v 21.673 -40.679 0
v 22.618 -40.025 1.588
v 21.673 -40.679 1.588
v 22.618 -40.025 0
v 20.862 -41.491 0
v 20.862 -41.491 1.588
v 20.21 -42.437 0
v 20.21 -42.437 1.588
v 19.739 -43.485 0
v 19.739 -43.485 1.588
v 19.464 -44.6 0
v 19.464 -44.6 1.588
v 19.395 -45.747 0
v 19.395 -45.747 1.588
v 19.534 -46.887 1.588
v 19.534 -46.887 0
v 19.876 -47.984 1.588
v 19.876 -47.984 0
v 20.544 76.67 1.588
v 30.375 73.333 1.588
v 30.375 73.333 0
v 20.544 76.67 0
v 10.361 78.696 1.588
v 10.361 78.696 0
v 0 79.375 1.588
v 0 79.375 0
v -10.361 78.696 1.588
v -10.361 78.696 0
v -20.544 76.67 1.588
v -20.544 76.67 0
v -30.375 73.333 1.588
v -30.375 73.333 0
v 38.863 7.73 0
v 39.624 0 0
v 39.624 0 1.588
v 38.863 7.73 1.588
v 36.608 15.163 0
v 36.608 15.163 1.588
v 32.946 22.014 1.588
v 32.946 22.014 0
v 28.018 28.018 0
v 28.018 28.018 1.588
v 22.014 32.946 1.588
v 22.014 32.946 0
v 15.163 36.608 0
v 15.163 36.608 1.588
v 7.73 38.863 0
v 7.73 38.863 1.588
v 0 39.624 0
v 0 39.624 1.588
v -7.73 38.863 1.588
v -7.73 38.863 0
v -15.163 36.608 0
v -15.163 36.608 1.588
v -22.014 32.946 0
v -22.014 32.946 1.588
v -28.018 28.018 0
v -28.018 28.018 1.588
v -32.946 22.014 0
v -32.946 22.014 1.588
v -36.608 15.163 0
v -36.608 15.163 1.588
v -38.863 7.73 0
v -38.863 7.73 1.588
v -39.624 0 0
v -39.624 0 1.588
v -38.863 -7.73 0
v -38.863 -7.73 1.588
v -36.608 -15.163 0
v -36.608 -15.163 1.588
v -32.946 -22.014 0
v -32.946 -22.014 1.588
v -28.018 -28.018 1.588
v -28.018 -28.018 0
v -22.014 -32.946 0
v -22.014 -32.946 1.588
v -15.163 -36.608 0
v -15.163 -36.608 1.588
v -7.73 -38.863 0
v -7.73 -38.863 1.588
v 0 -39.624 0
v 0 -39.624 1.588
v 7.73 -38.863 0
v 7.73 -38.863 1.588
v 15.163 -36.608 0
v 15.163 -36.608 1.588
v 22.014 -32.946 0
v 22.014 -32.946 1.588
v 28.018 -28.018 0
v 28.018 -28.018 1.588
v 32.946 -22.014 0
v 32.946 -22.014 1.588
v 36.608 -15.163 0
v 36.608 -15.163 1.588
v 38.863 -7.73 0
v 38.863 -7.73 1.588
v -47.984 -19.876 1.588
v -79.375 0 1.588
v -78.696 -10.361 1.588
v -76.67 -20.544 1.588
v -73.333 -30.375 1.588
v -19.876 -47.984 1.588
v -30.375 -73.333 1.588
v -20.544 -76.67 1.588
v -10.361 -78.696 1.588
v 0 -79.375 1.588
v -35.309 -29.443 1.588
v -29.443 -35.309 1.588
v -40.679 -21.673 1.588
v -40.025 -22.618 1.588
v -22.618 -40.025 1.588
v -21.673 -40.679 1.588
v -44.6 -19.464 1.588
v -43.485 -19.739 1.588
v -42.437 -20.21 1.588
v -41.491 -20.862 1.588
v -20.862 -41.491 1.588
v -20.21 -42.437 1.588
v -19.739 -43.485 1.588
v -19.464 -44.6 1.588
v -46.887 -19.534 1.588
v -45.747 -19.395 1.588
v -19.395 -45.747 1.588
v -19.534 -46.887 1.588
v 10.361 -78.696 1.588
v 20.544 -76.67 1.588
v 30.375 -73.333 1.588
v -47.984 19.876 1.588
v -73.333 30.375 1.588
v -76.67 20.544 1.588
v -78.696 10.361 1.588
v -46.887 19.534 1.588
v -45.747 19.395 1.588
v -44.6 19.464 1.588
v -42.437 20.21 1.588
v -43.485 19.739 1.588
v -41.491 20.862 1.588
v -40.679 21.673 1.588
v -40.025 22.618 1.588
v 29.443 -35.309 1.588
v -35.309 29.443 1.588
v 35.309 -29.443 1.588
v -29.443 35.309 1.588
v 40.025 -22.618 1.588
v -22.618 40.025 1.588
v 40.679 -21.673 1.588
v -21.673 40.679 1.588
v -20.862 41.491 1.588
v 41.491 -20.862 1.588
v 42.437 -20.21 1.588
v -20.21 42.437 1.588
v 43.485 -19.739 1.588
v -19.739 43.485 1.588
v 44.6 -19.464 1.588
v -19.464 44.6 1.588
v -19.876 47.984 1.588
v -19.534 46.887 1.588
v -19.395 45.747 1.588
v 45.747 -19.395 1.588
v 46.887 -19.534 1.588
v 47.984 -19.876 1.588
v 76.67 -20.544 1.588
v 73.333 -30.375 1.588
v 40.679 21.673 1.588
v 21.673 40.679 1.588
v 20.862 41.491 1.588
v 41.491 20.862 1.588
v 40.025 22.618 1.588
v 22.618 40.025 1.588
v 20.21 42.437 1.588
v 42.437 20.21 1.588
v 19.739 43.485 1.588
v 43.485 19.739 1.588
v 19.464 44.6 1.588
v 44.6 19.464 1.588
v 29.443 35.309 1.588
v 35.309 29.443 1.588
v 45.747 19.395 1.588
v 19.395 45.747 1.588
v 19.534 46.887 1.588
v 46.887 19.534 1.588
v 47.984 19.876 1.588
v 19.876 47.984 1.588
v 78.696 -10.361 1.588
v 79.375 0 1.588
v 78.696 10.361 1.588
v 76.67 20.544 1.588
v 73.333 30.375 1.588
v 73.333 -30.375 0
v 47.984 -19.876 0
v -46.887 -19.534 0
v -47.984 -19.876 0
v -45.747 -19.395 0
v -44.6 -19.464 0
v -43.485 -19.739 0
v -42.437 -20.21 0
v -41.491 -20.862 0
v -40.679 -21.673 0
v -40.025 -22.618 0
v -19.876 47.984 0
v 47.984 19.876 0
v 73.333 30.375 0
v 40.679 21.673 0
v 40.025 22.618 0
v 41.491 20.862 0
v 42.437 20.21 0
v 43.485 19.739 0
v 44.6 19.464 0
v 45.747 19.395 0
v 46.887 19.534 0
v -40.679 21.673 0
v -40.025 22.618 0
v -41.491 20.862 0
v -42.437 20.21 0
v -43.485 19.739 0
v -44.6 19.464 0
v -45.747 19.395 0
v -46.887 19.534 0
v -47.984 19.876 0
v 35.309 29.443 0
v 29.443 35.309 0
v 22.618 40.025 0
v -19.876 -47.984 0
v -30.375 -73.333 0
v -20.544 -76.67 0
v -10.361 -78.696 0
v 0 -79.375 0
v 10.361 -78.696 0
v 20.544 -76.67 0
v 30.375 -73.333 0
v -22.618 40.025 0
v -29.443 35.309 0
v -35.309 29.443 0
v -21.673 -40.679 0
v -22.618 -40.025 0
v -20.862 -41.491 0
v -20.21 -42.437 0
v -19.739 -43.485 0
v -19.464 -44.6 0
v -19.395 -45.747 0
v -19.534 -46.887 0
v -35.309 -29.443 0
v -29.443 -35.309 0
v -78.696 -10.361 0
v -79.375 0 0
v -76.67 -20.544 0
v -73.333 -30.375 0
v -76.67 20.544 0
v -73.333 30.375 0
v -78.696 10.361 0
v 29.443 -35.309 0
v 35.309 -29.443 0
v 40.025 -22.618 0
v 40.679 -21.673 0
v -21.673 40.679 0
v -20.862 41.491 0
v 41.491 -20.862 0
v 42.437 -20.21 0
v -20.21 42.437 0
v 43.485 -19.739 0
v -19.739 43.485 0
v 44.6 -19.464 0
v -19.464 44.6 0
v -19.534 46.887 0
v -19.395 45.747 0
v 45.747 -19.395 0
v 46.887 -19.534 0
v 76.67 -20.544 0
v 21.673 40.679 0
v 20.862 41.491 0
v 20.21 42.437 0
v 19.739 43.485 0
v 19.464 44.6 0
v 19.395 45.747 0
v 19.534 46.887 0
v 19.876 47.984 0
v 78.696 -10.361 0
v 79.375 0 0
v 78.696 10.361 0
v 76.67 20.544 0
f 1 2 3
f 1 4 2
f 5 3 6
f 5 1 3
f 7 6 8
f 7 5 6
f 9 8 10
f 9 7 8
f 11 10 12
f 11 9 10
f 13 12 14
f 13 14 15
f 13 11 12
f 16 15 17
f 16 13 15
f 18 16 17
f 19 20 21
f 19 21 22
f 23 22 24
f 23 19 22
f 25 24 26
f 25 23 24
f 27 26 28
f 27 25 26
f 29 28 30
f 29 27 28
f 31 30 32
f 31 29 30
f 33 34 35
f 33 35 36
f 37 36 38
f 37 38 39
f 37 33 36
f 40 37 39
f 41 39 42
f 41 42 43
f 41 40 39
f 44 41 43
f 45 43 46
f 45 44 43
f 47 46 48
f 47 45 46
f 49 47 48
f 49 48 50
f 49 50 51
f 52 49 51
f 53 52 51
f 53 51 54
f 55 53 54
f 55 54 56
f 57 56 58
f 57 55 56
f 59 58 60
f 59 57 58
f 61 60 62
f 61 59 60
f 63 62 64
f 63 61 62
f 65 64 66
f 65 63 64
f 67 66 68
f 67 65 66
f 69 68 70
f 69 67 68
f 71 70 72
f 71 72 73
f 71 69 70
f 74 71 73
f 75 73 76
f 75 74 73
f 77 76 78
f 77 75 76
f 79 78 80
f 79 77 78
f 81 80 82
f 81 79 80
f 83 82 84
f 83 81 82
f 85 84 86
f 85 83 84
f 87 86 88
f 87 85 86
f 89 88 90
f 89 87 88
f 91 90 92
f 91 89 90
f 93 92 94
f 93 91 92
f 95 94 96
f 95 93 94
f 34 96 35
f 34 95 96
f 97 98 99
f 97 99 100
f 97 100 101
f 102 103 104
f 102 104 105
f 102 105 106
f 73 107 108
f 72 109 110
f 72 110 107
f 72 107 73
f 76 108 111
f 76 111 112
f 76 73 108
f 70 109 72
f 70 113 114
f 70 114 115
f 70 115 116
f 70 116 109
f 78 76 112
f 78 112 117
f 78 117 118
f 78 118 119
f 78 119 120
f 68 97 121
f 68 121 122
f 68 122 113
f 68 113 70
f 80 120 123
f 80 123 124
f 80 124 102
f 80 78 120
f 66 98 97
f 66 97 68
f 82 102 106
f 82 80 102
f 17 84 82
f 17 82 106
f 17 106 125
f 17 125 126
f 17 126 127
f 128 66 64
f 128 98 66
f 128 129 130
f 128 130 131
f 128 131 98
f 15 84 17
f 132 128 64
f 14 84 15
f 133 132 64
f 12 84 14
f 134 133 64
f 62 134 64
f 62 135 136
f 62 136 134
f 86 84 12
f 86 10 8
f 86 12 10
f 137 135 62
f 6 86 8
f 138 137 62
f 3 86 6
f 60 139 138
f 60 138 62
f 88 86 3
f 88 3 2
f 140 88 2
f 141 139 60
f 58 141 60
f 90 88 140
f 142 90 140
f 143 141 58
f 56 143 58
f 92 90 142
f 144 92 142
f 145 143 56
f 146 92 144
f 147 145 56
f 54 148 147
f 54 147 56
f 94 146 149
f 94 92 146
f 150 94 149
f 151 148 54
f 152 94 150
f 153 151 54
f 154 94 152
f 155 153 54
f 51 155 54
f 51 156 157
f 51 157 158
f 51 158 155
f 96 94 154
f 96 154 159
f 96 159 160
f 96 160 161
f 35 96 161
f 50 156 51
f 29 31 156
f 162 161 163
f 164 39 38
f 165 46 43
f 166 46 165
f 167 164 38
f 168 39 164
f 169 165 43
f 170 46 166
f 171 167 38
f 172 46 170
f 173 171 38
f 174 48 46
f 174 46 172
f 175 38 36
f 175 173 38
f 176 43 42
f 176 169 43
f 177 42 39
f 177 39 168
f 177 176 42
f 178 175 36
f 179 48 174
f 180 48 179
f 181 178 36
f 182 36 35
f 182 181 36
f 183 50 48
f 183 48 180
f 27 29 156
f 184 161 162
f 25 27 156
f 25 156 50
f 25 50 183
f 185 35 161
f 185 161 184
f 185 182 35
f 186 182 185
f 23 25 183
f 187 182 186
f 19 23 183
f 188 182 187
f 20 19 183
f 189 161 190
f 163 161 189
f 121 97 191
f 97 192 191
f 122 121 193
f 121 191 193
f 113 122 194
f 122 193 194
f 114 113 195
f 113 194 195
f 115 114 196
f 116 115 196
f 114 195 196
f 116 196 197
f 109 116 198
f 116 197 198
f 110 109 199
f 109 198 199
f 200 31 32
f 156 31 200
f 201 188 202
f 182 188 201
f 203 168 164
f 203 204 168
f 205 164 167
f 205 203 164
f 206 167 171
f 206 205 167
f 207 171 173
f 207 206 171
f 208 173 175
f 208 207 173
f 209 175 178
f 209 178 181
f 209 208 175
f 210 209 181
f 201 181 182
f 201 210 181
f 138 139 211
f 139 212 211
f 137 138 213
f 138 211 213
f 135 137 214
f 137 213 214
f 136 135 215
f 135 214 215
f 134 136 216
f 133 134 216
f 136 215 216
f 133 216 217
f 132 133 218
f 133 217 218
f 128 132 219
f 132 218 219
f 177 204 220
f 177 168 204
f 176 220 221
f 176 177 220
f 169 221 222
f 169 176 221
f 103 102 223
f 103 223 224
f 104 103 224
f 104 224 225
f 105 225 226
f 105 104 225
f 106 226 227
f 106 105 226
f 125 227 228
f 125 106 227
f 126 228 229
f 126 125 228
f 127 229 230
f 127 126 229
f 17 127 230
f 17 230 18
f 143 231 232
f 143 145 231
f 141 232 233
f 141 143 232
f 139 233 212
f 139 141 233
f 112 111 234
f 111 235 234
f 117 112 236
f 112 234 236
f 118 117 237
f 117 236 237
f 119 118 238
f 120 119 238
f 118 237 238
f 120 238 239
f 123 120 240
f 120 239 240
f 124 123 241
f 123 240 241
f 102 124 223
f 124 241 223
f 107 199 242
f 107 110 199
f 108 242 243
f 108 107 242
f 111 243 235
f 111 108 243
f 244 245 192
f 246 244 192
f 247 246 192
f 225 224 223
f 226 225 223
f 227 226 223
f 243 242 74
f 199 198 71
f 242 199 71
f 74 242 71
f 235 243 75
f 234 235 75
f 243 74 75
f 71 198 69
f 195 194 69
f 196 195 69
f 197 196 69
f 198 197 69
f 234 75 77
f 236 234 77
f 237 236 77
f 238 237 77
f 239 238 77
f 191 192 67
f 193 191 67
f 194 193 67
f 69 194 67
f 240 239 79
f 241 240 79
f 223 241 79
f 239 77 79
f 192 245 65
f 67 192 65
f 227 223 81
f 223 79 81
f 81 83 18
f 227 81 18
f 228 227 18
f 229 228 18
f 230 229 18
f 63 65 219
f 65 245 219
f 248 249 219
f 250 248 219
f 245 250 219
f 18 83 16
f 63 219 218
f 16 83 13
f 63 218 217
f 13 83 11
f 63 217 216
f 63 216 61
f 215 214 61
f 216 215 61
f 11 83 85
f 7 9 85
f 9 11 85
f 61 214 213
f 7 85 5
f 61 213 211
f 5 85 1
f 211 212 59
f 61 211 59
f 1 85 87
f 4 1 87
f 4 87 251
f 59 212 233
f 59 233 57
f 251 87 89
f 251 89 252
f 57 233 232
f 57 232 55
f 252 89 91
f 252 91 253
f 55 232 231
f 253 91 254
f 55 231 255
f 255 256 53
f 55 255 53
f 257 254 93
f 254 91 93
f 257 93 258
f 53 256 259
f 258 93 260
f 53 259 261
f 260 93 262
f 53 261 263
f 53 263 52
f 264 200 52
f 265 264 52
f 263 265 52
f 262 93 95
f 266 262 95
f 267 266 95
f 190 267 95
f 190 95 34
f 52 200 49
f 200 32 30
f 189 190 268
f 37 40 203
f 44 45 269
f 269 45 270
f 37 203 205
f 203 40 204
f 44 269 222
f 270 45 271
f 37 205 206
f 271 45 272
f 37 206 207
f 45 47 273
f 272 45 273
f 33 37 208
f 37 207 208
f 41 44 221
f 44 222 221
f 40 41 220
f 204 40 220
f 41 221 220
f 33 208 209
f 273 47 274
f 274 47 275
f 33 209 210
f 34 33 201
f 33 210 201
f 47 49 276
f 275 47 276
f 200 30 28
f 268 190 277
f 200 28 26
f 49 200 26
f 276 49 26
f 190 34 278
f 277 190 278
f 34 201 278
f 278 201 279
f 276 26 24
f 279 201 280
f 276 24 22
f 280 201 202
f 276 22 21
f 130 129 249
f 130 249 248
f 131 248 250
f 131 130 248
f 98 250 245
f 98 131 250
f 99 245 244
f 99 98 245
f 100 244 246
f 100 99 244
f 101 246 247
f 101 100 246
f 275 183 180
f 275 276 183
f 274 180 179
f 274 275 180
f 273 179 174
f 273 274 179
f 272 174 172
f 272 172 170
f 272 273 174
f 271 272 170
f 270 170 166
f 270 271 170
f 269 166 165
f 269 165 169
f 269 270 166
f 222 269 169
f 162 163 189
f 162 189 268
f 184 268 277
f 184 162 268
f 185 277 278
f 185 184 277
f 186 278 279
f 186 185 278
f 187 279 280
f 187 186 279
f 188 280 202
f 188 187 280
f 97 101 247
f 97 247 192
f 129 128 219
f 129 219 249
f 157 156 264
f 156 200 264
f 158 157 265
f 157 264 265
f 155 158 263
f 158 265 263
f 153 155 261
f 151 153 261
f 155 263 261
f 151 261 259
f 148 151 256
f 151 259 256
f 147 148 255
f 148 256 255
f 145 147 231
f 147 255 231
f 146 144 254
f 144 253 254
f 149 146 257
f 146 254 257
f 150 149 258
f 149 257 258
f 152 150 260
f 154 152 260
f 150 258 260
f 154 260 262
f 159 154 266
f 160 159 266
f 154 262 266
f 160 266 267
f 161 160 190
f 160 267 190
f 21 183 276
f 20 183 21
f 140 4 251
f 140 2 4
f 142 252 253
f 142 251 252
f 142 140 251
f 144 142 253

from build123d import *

# Parameters (mm, degrees)
SKETCH1_R                = 79.375
SKETCH1_R_2              = 39.624
BOSS_EXTRUDE1_DEPTH      = 1.5875
SKETCH2_R                = 79.375
SKETCH2_R_2              = 45.974
CUT_EXTRUDE1_DEPTH       = 2.5875
BOSS_EXTRUDE2_DEPTH      = 1.5875
FILLET1_R                = 6.35
CIRPATTERN1_COUNT        = 4
FILLET1_OF_CIRPATTERN1_R = 6.35


with BuildPart() as part:
    # Sketch1 → Boss-Extrude1 (new body)
    with BuildSketch(Plane.XY):
        Circle(SKETCH1_R)
        Circle(SKETCH1_R_2, mode=Mode.SUBTRACT)
    extrude(amount=BOSS_EXTRUDE1_DEPTH)

    # Sketch2 → Cut-Extrude1 (cut, through all)
    with BuildSketch(Plane.XY.offset(1.5875)):
        Circle(SKETCH2_R)
        Circle(SKETCH2_R_2, mode=Mode.SUBTRACT)
    extrude(amount=-CUT_EXTRUDE1_DEPTH, mode=Mode.SUBTRACT)

    # Sketch3 → Boss-Extrude2 (add)
    with BuildSketch(Plane.XY.offset(1.5875)):
        with BuildLine():
            ThreePointArc((30.375497444, 73.332937893), (0, 79.375), (-30.375497444, 73.332937893))
            Line((-30.375497444, 73.332937893), (-17.59348812, 42.474437628))
            ThreePointArc((-17.59348812, 42.474437628), (0, 45.974), (17.59348812, 42.474437628))
            Line((17.59348812, 42.474437628), (30.375497444, 73.332937893))
        make_face()
    boss_extrude2 = extrude(amount=-BOSS_EXTRUDE2_DEPTH)

    # Fillet1
    fillet1_edges = [part.edges().sort_by_distance(p)[0] for p in [
        (17.59348812, 42.474437628, 0.79375),
        (-17.59348812, 42.474437628, 0.79375),
    ]]
    fillet(fillet1_edges, radius=FILLET1_R)

    # CirPattern1: Boss-Extrude2 ×4 about axis
    cirpattern1_axis = Axis((0, 0, 0), (0, 0, 1))
    for i in range(1, CIRPATTERN1_COUNT):
        add(boss_extrude2.rotate(cirpattern1_axis, i * 360 / CIRPATTERN1_COUNT))

    # Fillet1 of CirPattern1
    fillet1_of_cirpattern1_edges = [part.edges().sort_by_distance(p)[0] for p in [
        (-42.474437628, 17.59348812, 0.79375),
        (-42.474437628, -17.59348812, 0.79375),
        (-17.59348812, -42.474437628, 0.79375),
        (17.59348812, -42.474437628, 0.79375),
        (42.474437628, -17.59348812, 0.79375),
        (42.474437628, 17.59348812, 0.79375),
    ]]
    fillet(fillet1_of_cirpattern1_edges, radius=FILLET1_OF_CIRPATTERN1_R)


solid = part.part
